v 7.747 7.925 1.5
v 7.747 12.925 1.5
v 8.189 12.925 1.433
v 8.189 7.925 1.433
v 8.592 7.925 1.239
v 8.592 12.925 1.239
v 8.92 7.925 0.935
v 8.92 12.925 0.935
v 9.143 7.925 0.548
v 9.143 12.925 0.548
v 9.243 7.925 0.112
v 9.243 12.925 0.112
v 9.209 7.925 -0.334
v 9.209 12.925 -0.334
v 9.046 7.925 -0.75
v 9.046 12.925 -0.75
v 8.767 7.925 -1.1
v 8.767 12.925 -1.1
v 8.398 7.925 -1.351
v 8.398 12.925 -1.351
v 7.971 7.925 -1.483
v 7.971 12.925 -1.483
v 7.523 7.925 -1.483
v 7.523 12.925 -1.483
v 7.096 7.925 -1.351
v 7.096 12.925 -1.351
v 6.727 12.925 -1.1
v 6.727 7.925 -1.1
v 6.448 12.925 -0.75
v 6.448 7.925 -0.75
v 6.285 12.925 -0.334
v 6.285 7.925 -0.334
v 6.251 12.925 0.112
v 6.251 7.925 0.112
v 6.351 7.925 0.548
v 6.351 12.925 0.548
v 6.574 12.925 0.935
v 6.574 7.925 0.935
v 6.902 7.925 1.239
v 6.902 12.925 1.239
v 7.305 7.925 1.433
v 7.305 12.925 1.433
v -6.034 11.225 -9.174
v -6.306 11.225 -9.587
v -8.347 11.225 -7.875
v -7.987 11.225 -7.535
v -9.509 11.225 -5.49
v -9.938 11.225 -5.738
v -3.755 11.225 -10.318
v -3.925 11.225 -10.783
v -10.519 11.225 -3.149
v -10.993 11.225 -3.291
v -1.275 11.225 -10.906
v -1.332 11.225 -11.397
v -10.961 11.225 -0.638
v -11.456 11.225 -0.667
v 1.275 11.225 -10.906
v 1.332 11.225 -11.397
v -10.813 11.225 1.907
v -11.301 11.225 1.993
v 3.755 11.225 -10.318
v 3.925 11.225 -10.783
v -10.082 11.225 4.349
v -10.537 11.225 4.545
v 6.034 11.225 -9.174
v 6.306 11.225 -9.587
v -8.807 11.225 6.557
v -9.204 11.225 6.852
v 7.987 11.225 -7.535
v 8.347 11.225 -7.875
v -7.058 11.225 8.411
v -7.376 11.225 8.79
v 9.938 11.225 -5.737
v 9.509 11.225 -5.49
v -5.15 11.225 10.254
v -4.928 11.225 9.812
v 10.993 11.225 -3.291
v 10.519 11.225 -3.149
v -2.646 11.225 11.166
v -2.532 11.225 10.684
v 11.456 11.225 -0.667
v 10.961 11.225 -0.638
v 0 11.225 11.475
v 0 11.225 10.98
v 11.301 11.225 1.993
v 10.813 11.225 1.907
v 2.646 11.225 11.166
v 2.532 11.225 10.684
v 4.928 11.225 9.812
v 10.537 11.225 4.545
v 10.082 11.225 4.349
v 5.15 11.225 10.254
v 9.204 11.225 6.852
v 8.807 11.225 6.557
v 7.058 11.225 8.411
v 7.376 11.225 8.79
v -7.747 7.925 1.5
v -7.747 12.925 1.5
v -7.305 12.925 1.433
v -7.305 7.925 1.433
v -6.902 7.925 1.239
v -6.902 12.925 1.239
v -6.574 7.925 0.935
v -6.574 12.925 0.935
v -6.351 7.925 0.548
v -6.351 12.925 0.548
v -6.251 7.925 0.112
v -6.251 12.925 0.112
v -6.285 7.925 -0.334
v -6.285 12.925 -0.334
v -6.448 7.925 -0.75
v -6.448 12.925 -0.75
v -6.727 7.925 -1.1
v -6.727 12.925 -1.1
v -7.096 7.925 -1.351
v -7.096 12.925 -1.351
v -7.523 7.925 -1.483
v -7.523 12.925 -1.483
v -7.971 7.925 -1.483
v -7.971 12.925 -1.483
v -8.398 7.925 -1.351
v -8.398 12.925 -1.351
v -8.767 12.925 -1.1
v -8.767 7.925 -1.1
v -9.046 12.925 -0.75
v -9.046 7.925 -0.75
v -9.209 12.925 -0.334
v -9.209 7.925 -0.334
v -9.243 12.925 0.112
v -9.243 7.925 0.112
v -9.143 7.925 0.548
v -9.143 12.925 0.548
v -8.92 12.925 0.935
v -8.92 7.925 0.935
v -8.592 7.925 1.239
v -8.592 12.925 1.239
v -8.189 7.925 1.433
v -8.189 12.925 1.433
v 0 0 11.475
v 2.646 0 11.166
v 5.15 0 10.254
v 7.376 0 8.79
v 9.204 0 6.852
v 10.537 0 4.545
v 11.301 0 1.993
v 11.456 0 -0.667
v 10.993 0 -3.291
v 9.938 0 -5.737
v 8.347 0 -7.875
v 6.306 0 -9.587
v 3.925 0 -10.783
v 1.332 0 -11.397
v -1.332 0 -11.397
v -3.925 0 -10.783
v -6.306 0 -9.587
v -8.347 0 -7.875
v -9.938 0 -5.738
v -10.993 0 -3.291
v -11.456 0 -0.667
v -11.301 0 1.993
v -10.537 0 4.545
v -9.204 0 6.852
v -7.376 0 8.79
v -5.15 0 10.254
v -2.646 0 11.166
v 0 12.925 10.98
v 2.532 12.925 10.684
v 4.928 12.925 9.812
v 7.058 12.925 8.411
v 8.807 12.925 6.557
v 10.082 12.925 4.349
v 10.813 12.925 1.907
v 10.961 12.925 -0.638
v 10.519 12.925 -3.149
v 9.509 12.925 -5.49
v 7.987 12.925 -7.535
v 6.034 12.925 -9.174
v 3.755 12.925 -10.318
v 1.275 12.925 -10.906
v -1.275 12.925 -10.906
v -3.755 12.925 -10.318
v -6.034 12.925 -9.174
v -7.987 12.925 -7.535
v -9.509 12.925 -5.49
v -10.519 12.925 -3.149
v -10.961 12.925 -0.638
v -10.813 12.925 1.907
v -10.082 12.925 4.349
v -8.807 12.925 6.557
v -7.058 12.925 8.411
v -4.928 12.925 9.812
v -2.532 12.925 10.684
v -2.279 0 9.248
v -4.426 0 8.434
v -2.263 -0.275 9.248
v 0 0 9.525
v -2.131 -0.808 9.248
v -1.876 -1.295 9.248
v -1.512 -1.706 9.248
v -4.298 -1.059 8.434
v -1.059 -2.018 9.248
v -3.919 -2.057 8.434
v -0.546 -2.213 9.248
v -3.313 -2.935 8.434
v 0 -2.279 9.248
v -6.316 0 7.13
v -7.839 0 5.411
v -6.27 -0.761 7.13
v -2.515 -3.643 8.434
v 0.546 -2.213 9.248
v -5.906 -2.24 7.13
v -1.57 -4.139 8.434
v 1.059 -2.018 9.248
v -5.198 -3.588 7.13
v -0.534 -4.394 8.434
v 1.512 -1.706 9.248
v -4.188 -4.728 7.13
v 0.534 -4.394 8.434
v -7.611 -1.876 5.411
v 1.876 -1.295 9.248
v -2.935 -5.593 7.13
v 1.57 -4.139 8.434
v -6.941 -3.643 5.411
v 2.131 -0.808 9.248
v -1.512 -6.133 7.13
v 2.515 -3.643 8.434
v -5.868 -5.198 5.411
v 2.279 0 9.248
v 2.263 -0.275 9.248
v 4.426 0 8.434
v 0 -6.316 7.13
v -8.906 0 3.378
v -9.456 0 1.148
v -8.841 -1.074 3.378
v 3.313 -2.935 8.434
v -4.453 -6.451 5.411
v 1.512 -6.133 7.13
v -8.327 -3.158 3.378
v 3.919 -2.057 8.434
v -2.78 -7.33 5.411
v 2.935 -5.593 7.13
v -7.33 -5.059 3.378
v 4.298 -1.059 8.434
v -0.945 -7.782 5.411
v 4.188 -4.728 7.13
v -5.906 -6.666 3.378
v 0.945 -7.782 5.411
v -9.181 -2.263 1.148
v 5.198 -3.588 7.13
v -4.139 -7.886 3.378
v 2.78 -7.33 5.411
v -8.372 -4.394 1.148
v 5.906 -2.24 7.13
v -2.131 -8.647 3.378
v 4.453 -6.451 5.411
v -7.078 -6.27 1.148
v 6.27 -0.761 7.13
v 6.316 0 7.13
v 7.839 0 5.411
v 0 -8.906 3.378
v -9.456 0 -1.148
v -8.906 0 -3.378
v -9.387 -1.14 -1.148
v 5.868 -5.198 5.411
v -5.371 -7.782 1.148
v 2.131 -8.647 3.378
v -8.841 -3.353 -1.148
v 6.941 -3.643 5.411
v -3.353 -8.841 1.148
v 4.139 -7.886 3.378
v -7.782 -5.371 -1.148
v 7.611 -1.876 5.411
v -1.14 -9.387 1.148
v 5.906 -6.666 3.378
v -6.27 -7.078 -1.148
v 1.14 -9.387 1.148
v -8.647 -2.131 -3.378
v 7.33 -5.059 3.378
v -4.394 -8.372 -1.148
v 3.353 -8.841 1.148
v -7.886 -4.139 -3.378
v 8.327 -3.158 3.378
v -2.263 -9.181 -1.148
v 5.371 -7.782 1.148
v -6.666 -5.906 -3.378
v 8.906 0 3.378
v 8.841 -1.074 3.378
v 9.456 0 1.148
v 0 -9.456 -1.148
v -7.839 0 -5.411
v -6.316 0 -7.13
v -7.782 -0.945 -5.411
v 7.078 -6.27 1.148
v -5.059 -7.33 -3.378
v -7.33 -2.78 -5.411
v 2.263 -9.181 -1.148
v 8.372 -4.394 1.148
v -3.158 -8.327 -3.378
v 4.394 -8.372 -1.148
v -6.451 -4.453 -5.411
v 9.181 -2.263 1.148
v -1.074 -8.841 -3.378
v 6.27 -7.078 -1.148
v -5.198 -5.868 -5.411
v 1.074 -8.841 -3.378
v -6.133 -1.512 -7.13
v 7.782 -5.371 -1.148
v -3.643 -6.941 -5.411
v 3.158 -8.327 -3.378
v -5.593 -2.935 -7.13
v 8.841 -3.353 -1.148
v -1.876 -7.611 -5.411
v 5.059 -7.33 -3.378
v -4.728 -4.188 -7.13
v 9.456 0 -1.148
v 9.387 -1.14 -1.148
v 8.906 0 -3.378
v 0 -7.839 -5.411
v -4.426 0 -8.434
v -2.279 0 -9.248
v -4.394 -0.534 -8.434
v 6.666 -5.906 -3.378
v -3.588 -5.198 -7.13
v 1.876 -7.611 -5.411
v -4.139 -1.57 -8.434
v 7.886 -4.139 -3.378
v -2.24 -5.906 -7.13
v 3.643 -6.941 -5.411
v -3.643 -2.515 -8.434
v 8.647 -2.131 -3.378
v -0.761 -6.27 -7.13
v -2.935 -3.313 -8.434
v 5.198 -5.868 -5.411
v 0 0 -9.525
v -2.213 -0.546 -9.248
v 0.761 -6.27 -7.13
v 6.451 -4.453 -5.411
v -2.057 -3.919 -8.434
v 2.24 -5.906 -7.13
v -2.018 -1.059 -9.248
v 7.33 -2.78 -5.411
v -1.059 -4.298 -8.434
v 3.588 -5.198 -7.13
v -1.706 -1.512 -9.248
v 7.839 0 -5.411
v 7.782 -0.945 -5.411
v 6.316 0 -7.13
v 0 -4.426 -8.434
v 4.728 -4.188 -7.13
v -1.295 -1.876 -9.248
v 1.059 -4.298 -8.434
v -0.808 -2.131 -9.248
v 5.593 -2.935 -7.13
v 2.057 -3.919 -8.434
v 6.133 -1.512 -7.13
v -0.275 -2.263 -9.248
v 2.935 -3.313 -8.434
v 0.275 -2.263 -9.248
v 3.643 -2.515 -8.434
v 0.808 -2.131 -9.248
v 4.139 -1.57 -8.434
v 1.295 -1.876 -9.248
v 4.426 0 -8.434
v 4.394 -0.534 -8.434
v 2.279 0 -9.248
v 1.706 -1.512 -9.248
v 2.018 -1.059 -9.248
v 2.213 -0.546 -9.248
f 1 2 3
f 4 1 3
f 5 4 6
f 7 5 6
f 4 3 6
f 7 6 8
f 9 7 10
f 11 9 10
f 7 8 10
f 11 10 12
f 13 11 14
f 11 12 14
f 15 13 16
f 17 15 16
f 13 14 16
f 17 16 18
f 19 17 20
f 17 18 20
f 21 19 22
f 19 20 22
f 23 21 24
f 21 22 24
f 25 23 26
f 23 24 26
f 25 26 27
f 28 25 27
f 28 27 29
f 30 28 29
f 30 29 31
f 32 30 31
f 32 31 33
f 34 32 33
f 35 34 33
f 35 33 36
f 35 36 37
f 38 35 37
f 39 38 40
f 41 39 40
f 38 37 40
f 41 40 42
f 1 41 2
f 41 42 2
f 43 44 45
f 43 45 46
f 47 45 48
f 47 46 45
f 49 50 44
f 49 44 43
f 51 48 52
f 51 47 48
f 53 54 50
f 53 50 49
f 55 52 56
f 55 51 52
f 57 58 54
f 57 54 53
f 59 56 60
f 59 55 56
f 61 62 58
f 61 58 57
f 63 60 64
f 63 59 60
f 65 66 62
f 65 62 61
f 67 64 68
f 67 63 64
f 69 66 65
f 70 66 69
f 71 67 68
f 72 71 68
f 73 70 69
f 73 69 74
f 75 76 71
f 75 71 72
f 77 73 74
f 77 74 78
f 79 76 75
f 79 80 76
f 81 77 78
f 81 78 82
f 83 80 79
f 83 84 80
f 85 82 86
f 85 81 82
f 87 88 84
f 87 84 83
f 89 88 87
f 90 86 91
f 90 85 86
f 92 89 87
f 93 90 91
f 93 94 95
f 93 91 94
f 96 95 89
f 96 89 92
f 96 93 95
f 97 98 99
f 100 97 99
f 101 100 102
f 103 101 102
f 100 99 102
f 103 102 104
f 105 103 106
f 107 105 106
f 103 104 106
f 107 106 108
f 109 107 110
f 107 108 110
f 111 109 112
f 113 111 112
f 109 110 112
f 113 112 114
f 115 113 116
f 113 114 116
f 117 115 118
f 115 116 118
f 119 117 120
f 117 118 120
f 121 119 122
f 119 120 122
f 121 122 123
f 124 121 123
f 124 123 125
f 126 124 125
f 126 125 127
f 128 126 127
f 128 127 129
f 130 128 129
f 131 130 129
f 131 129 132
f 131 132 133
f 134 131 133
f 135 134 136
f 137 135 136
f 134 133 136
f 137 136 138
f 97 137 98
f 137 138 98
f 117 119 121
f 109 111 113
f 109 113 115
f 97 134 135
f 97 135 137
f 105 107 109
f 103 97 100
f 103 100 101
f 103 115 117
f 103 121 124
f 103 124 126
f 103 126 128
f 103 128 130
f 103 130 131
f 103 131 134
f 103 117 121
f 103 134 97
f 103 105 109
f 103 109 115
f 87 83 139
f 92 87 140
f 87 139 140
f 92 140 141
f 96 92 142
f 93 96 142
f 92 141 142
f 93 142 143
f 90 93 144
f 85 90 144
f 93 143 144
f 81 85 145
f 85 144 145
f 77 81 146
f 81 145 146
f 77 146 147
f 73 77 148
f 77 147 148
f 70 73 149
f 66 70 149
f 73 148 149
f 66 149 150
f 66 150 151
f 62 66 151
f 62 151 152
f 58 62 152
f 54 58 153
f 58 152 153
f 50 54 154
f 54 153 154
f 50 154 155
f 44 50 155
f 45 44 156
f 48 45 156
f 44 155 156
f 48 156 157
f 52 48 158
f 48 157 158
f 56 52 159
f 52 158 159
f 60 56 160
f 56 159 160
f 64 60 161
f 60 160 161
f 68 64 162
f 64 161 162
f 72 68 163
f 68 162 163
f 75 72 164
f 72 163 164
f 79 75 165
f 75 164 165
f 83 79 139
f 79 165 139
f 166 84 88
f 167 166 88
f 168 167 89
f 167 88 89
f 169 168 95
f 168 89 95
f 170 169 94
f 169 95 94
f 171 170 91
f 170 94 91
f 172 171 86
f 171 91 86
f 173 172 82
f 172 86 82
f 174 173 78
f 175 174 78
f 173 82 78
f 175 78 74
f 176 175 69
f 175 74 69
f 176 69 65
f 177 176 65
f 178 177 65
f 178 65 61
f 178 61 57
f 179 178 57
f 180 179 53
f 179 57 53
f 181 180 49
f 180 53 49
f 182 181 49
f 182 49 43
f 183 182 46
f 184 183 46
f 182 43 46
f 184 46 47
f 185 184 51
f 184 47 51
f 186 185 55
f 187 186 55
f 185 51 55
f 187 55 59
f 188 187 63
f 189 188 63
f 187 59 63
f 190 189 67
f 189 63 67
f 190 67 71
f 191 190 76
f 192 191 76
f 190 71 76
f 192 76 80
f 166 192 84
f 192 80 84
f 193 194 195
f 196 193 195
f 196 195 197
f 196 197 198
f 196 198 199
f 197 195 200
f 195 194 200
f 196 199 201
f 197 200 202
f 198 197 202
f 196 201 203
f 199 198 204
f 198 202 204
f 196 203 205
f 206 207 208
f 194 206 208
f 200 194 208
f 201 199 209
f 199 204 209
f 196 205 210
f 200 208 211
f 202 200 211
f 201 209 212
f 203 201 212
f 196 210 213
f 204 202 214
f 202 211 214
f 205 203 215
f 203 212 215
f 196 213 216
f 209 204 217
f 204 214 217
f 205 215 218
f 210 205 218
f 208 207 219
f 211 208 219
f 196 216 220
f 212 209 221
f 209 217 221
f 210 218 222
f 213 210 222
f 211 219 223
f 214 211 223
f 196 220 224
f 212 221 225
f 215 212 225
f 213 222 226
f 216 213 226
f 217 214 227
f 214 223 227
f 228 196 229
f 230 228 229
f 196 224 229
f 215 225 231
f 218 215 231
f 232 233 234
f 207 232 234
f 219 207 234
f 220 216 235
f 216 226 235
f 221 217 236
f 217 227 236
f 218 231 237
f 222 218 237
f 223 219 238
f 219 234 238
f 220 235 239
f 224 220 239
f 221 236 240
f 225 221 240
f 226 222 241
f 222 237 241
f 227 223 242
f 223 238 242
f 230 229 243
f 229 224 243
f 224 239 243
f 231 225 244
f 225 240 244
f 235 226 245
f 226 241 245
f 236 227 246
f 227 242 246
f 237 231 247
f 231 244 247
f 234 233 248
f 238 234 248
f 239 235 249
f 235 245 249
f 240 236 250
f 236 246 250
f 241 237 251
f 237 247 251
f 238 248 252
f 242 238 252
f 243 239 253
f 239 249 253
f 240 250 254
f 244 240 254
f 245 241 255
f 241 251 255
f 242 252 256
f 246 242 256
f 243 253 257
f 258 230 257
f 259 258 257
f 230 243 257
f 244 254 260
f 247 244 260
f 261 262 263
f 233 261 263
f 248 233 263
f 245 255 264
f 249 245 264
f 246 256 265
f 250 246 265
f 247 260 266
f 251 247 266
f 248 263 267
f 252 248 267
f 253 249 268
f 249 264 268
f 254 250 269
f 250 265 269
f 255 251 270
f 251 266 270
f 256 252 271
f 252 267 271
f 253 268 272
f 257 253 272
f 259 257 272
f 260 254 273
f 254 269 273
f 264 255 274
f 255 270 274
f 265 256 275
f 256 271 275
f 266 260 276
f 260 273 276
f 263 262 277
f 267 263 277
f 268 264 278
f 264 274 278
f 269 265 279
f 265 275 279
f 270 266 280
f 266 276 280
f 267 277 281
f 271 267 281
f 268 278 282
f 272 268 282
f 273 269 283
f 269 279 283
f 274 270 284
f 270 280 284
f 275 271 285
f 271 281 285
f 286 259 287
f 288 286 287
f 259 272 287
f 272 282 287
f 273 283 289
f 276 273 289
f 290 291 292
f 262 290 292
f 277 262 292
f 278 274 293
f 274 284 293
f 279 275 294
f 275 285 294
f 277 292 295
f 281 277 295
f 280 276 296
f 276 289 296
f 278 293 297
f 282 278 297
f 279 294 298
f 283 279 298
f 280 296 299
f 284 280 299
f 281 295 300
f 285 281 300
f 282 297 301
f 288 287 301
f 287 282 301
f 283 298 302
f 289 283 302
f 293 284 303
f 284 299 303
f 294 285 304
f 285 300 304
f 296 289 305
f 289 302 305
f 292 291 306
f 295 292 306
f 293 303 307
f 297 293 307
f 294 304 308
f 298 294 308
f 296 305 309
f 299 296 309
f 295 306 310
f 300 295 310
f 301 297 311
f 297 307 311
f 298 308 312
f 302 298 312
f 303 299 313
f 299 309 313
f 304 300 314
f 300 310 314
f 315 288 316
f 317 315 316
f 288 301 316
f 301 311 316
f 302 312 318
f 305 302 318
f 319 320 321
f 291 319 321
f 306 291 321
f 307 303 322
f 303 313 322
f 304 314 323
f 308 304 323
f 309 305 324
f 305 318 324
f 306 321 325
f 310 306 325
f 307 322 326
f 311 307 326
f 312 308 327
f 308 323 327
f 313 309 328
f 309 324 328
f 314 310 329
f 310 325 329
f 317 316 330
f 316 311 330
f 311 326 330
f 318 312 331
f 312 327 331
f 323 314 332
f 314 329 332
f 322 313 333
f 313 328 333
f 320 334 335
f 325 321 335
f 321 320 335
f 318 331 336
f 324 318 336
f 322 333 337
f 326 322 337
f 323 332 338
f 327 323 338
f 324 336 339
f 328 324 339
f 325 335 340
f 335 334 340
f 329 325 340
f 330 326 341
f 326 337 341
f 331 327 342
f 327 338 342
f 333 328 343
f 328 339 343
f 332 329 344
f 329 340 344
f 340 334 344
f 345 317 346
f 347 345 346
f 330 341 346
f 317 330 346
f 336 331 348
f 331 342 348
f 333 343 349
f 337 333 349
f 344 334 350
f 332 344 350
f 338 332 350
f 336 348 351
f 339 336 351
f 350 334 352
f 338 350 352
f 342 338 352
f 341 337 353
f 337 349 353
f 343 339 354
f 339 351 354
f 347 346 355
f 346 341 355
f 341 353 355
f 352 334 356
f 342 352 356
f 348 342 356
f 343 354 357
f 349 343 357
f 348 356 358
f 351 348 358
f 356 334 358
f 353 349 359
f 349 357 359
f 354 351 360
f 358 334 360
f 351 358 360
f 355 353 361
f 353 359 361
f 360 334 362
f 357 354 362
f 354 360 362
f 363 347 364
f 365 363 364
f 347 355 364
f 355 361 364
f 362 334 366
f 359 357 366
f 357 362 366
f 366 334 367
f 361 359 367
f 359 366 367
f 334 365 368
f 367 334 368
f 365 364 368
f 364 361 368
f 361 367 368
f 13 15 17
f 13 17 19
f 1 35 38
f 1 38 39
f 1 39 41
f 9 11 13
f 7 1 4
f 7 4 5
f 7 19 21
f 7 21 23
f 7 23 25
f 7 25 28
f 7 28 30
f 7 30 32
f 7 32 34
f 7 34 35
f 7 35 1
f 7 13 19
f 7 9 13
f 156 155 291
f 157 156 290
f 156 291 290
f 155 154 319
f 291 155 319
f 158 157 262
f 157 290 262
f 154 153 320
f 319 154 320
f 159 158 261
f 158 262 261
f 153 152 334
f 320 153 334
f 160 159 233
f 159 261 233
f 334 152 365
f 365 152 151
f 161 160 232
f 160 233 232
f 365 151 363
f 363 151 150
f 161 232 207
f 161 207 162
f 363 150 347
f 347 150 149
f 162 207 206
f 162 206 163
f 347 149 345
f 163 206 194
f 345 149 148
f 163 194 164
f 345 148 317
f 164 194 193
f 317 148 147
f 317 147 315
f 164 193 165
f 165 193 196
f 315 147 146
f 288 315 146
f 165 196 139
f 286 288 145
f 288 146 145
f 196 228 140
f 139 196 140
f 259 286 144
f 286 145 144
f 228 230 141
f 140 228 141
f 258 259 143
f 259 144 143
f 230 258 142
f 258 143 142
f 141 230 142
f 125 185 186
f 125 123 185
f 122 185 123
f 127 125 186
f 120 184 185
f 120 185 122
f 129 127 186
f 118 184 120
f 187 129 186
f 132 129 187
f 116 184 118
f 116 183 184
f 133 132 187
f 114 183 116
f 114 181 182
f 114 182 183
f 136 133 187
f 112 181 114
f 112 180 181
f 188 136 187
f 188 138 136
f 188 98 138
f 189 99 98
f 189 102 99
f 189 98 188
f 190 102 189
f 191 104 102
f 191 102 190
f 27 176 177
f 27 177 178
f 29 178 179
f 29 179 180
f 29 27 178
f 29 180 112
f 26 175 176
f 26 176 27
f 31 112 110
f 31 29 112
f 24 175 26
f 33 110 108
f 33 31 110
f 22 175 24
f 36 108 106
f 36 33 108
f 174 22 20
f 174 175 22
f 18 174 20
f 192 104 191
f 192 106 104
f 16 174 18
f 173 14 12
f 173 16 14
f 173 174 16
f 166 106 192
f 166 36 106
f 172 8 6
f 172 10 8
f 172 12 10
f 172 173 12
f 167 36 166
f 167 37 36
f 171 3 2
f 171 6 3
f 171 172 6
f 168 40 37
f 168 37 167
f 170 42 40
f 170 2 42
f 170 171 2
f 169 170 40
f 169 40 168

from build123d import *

# Parameters (mm, degrees)
SKETCH2_R           = 11.475
BOSS_EXTRUDE1_DEPTH = 11.225
SKETCH5_R           = 10.98
BOSS_EXTRUDE3_DEPTH = 1.7
SKETCH6_R           = 1.5
CUT_EXTRUDE4_DEPTH  = 5


with BuildPart() as part:
    # Sketch1 → Revolve1 (revolve)
    with BuildSketch(Plane(origin=(0, 0, 0), x_dir=(1, 0, 0), z_dir=(0, 1, 0))):
        with BuildLine():
            Line((0, 9.525), (0, -9.525))
            ThreePointArc((0, -9.525), (9.525, 0), (0, 9.525))
        make_face()
    revolve(axis=Axis((0, 0, -9.525), (0, 0, 1)))

    # Sketch2 → Boss-Extrude1 (add)
    with BuildSketch(Plane(origin=(0, 0, 0), x_dir=(1, 0, 0), z_dir=(0, 1, 0))):
        with Locations(Location((0, 0, 0), (0, 0, 270))):
            Circle(SKETCH2_R)
    extrude(amount=BOSS_EXTRUDE1_DEPTH)

    # Sketch5 → Boss-Extrude3 (add)
    with BuildSketch(Plane(origin=(0, 11.225, 0), x_dir=(1, 0, 0), z_dir=(0, 1, 0))):
        with Locations(Location((0, 0, 0), (0, 0, 270))):
            Circle(SKETCH5_R)
    extrude(amount=BOSS_EXTRUDE3_DEPTH)

    # Sketch6 → Cut-Extrude4 (cut)
    with BuildSketch(Plane(origin=(0, 12.925, 0), x_dir=(1, 0, 0), z_dir=(0, 1, 0))):
        with Locations(Location((7.747, 0, 0), (0, 0, 270))):
            Circle(SKETCH6_R)
        with Locations(Location((-7.747, 0, 0), (0, 0, 270))):
            Circle(SKETCH6_R)
    extrude(amount=-CUT_EXTRUDE4_DEPTH, mode=Mode.SUBTRACT)


solid = part.part
